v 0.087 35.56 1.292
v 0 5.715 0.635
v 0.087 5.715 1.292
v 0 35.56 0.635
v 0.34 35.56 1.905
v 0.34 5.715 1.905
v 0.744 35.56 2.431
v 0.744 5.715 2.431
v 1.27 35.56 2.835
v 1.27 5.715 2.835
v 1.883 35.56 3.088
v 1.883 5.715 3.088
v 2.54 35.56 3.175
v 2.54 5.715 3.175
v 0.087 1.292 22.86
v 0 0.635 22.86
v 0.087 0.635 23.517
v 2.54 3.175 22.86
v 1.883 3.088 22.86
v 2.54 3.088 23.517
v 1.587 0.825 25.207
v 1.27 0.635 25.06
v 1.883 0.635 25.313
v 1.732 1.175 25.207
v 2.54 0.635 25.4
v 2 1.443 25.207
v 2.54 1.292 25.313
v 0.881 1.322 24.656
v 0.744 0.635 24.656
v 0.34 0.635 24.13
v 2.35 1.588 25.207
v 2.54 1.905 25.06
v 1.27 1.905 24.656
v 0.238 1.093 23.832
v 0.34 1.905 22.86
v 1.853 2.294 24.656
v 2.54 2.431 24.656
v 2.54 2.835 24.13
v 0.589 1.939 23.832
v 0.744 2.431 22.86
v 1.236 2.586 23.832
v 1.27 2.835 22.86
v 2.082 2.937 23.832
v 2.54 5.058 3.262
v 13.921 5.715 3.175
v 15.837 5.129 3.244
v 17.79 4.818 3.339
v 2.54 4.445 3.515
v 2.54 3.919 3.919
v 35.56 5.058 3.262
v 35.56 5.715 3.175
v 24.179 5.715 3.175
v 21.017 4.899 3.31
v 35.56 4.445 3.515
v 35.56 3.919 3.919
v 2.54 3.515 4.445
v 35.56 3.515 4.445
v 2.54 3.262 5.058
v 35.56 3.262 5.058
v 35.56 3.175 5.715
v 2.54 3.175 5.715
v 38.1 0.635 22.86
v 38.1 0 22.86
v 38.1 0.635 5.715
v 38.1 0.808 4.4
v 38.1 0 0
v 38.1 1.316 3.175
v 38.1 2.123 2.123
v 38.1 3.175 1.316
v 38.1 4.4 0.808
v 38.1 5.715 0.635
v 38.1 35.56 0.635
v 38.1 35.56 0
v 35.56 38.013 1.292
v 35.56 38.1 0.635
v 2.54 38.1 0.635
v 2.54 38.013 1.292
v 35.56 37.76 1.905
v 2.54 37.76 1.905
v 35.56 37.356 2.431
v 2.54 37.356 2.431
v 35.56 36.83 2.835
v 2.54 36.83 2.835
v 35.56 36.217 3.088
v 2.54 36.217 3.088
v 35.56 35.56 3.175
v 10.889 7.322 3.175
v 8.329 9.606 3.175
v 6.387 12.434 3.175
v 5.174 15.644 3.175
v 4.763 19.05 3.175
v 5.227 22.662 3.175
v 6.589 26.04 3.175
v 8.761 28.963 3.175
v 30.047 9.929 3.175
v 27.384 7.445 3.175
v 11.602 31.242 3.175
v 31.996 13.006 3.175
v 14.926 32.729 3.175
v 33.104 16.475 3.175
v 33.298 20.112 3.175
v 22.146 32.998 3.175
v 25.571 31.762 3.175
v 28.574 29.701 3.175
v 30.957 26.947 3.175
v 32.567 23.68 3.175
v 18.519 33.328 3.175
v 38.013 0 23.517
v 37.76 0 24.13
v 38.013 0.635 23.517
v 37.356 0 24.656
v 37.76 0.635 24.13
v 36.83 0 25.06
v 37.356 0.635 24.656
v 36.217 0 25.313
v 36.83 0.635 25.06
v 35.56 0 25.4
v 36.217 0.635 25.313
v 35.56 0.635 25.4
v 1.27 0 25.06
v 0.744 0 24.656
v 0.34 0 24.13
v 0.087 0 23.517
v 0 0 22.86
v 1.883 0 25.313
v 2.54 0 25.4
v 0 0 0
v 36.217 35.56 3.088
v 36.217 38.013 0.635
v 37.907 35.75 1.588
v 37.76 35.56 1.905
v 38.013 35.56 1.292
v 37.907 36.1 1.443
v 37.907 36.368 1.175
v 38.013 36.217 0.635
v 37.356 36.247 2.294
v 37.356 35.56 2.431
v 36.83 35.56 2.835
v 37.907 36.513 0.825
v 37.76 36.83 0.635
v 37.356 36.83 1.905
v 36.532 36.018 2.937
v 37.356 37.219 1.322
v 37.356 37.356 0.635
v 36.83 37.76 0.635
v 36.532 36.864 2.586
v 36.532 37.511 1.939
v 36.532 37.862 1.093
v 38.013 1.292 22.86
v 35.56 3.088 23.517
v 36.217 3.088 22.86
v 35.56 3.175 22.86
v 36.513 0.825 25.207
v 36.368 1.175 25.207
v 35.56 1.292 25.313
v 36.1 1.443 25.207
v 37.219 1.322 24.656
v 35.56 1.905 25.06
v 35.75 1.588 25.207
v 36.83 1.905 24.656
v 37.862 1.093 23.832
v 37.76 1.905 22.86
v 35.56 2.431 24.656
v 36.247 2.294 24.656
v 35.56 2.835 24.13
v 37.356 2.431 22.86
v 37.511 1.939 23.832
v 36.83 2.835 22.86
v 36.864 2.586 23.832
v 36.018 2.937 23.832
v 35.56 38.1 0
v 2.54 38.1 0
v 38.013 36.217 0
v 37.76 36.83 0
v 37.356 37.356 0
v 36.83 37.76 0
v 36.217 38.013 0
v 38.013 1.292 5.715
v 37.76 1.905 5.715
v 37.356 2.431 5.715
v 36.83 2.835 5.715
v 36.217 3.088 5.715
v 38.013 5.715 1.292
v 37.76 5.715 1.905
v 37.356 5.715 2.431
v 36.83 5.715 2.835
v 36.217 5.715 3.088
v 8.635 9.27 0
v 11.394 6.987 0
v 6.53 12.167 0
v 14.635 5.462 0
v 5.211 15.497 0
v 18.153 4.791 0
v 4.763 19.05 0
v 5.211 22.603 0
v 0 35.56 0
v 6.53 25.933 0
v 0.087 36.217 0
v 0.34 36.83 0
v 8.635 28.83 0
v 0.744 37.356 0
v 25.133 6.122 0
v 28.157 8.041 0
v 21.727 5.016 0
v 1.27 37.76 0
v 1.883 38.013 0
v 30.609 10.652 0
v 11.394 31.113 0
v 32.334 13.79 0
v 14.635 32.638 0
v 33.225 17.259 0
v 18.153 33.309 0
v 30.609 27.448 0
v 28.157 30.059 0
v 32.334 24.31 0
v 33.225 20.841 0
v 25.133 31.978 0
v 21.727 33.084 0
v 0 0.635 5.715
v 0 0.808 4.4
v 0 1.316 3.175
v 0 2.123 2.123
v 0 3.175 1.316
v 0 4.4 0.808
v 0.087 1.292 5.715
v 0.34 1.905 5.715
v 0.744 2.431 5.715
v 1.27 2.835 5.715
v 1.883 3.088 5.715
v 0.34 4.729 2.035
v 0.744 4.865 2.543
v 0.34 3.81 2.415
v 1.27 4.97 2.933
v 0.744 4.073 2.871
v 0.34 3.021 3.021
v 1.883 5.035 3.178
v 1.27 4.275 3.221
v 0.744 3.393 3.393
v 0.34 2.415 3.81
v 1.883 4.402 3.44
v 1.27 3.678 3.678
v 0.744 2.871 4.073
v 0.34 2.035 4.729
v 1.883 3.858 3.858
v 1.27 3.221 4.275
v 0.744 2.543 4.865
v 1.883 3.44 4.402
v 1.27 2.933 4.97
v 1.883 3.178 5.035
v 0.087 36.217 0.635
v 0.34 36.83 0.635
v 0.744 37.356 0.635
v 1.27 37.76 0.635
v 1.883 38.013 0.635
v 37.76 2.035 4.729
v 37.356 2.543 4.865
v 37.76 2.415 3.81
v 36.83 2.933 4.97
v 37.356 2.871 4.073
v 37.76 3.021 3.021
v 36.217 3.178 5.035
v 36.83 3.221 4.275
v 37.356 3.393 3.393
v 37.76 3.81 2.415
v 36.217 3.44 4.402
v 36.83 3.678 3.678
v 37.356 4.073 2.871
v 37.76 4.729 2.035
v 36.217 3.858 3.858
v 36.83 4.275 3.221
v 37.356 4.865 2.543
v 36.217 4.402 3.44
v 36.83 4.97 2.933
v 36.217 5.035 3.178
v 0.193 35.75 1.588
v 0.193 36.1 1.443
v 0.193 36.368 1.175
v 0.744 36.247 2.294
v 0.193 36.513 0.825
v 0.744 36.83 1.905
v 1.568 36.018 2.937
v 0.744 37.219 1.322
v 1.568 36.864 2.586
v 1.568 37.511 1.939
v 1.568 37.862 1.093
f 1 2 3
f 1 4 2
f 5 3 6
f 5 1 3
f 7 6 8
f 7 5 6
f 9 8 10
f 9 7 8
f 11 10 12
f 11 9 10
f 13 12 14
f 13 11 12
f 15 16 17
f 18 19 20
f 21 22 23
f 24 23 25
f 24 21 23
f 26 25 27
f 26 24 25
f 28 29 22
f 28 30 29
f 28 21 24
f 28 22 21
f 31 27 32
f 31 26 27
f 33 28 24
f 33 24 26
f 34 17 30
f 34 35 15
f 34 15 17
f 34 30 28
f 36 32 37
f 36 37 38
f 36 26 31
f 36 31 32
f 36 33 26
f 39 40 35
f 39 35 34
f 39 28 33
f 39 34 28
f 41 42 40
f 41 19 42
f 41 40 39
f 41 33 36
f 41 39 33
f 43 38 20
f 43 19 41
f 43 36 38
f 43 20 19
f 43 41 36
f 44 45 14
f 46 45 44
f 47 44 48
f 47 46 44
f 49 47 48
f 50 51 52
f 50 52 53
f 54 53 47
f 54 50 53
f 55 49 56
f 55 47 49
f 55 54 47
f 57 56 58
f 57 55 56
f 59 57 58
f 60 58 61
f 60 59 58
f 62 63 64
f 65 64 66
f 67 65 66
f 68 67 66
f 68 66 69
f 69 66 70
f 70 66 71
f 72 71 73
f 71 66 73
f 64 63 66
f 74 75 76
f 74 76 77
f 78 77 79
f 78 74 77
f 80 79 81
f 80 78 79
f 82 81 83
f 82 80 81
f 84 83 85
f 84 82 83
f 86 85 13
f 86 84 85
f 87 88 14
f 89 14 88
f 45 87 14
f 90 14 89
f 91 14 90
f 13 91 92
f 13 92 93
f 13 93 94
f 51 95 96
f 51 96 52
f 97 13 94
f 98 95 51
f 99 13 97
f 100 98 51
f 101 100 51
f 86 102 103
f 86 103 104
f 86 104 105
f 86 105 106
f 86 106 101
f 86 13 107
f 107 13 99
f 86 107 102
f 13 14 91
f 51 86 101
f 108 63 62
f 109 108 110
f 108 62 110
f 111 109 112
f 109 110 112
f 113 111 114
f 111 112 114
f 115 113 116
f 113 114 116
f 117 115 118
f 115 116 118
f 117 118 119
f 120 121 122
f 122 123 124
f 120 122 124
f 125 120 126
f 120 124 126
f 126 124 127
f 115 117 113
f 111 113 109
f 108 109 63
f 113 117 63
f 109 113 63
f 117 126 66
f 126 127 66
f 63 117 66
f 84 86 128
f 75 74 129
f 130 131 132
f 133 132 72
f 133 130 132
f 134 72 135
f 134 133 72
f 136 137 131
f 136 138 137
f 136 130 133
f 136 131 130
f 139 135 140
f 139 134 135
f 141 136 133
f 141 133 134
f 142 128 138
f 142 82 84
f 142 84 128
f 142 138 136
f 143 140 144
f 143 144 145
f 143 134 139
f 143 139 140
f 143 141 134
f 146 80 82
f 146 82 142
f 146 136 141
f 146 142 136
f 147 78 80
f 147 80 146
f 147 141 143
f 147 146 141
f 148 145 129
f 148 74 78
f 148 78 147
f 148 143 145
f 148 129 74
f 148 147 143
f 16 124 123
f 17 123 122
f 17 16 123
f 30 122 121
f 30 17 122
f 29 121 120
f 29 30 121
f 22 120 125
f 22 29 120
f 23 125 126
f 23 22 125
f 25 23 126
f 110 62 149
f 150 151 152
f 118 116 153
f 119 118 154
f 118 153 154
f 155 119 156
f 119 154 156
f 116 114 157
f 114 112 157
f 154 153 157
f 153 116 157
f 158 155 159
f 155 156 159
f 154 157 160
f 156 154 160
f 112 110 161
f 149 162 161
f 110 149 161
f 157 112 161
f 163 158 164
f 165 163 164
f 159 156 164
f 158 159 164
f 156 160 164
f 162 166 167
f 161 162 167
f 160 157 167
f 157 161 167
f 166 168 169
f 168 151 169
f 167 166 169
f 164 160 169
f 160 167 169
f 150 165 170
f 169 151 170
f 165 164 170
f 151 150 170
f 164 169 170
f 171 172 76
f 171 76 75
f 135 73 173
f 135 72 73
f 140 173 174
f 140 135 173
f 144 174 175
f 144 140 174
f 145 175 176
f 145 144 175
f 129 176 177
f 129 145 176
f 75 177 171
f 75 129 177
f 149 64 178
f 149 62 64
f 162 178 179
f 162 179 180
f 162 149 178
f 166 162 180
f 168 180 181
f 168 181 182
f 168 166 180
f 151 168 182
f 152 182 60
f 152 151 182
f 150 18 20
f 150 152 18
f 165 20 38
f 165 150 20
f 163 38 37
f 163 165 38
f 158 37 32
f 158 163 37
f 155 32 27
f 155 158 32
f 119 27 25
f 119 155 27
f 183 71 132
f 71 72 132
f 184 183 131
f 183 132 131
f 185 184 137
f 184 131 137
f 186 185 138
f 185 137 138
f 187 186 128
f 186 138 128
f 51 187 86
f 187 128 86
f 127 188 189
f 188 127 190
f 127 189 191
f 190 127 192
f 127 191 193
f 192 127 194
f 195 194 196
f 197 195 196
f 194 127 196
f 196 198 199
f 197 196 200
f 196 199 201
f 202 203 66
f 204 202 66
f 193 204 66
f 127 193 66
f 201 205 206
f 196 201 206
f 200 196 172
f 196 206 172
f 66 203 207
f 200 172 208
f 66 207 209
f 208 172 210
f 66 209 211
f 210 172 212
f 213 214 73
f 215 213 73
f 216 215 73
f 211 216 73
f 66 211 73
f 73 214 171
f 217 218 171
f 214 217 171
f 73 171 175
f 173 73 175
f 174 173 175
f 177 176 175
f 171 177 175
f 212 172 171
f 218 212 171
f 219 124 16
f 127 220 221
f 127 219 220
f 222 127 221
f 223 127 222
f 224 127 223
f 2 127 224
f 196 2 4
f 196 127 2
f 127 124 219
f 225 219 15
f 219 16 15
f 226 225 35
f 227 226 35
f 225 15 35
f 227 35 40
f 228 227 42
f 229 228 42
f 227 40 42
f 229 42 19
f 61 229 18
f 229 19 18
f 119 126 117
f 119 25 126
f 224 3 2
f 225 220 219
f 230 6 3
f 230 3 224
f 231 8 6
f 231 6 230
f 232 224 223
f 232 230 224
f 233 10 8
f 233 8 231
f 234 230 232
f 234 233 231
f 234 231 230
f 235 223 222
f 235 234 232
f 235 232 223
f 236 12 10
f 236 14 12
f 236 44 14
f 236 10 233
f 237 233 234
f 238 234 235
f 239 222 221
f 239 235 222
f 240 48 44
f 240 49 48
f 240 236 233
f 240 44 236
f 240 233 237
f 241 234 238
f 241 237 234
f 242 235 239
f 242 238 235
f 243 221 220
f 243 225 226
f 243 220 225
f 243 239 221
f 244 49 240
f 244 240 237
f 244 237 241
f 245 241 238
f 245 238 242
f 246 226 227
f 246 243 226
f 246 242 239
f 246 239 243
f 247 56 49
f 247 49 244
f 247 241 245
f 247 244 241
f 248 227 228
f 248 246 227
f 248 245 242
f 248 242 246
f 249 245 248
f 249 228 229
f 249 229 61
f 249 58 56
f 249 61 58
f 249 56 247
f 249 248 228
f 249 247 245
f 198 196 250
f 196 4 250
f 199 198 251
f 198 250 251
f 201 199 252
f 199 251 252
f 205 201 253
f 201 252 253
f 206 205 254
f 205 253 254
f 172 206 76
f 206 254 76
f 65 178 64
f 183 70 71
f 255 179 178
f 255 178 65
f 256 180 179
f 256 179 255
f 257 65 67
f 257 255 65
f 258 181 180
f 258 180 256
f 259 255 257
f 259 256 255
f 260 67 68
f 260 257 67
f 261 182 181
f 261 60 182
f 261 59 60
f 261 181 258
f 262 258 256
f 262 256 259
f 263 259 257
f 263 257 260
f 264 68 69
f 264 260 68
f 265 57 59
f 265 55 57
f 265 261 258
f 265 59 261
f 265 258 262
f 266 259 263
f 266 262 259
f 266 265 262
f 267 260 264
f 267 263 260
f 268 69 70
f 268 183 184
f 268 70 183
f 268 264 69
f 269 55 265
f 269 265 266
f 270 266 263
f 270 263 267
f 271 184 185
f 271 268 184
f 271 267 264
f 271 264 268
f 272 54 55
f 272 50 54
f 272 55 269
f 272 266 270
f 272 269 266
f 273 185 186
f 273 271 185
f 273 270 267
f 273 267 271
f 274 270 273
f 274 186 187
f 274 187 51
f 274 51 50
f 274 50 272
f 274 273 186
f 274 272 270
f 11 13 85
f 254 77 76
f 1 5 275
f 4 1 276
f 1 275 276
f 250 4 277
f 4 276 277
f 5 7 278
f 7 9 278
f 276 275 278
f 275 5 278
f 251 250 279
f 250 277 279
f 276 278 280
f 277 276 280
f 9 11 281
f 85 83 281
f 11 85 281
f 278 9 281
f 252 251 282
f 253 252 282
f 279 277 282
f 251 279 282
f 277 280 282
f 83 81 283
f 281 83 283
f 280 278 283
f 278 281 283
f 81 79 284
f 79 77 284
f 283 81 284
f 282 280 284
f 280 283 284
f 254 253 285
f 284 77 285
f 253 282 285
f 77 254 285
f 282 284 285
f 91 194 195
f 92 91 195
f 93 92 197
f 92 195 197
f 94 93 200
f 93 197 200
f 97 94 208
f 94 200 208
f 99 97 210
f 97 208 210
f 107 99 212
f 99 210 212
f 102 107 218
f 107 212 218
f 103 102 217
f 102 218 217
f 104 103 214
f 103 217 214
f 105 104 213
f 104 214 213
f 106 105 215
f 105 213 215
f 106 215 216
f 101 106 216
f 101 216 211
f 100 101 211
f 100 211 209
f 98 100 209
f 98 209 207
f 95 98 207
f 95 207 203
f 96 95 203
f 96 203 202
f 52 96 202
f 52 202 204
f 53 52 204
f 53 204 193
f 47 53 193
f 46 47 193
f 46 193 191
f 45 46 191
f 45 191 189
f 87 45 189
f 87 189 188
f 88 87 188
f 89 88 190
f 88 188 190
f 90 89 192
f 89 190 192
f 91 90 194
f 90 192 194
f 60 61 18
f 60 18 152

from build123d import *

# Parameters (mm, degrees)
SKETCH2_W           = 38.1
SKETCH2_H           = 38.1
BOSS_EXTRUDE1_DEPTH = 3.175
SKETCH3_W           = 38.1
SKETCH3_H           = 3.175
BOSS_EXTRUDE2_DEPTH = 22.225
FILLET1_R           = 2.54
SKETCH4_R           = 14.2875
CUT_EXTRUDE1_DEPTH  = 60.56828015


with BuildPart() as part:
    # Sketch2 → Boss-Extrude1 (new body)
    with BuildSketch(Plane.XY):
        with Locations((19.05, 19.05)):
            Rectangle(SKETCH2_W, SKETCH2_H)
    extrude(amount=BOSS_EXTRUDE1_DEPTH)

    # Sketch3 → Boss-Extrude2 (add)
    with BuildSketch(Plane.XY.offset(3.175)):
        with Locations((19.05, 1.5875)):
            Rectangle(SKETCH3_W, SKETCH3_H)
    extrude(amount=BOSS_EXTRUDE2_DEPTH)

    # Fillet1
    fillet1_edges = [part.edges().sort_by_distance(p)[0] for p in [
        (19.05, 38.1, 3.175),
        (38.1, 20.6375, 3.175),
        (0, 3.175, 14.2875),
        (19.05, 3.175, 3.175),
        (38.1, 3.175, 14.2875),
        (0, 1.5875, 25.4),
        (38.1, 1.5875, 25.4),
        (19.05, 3.175, 25.4),
        (0, 20.6375, 3.175),
        (0, 38.1, 1.5875),
        (38.1, 38.1, 1.5875),
    ]]
    fillet(fillet1_edges, radius=FILLET1_R)

    # Sketch4 → Cut-Extrude1 (cut, through all)
    with BuildSketch(Plane(origin=(0, 0, 0), x_dir=(-1, 0, 0), z_dir=(0, 0, -1))):
        with Locations((-19.05, 19.05)):
            Circle(SKETCH4_R)
    extrude(amount=-CUT_EXTRUDE1_DEPTH, mode=Mode.SUBTRACT)


solid = part.part
